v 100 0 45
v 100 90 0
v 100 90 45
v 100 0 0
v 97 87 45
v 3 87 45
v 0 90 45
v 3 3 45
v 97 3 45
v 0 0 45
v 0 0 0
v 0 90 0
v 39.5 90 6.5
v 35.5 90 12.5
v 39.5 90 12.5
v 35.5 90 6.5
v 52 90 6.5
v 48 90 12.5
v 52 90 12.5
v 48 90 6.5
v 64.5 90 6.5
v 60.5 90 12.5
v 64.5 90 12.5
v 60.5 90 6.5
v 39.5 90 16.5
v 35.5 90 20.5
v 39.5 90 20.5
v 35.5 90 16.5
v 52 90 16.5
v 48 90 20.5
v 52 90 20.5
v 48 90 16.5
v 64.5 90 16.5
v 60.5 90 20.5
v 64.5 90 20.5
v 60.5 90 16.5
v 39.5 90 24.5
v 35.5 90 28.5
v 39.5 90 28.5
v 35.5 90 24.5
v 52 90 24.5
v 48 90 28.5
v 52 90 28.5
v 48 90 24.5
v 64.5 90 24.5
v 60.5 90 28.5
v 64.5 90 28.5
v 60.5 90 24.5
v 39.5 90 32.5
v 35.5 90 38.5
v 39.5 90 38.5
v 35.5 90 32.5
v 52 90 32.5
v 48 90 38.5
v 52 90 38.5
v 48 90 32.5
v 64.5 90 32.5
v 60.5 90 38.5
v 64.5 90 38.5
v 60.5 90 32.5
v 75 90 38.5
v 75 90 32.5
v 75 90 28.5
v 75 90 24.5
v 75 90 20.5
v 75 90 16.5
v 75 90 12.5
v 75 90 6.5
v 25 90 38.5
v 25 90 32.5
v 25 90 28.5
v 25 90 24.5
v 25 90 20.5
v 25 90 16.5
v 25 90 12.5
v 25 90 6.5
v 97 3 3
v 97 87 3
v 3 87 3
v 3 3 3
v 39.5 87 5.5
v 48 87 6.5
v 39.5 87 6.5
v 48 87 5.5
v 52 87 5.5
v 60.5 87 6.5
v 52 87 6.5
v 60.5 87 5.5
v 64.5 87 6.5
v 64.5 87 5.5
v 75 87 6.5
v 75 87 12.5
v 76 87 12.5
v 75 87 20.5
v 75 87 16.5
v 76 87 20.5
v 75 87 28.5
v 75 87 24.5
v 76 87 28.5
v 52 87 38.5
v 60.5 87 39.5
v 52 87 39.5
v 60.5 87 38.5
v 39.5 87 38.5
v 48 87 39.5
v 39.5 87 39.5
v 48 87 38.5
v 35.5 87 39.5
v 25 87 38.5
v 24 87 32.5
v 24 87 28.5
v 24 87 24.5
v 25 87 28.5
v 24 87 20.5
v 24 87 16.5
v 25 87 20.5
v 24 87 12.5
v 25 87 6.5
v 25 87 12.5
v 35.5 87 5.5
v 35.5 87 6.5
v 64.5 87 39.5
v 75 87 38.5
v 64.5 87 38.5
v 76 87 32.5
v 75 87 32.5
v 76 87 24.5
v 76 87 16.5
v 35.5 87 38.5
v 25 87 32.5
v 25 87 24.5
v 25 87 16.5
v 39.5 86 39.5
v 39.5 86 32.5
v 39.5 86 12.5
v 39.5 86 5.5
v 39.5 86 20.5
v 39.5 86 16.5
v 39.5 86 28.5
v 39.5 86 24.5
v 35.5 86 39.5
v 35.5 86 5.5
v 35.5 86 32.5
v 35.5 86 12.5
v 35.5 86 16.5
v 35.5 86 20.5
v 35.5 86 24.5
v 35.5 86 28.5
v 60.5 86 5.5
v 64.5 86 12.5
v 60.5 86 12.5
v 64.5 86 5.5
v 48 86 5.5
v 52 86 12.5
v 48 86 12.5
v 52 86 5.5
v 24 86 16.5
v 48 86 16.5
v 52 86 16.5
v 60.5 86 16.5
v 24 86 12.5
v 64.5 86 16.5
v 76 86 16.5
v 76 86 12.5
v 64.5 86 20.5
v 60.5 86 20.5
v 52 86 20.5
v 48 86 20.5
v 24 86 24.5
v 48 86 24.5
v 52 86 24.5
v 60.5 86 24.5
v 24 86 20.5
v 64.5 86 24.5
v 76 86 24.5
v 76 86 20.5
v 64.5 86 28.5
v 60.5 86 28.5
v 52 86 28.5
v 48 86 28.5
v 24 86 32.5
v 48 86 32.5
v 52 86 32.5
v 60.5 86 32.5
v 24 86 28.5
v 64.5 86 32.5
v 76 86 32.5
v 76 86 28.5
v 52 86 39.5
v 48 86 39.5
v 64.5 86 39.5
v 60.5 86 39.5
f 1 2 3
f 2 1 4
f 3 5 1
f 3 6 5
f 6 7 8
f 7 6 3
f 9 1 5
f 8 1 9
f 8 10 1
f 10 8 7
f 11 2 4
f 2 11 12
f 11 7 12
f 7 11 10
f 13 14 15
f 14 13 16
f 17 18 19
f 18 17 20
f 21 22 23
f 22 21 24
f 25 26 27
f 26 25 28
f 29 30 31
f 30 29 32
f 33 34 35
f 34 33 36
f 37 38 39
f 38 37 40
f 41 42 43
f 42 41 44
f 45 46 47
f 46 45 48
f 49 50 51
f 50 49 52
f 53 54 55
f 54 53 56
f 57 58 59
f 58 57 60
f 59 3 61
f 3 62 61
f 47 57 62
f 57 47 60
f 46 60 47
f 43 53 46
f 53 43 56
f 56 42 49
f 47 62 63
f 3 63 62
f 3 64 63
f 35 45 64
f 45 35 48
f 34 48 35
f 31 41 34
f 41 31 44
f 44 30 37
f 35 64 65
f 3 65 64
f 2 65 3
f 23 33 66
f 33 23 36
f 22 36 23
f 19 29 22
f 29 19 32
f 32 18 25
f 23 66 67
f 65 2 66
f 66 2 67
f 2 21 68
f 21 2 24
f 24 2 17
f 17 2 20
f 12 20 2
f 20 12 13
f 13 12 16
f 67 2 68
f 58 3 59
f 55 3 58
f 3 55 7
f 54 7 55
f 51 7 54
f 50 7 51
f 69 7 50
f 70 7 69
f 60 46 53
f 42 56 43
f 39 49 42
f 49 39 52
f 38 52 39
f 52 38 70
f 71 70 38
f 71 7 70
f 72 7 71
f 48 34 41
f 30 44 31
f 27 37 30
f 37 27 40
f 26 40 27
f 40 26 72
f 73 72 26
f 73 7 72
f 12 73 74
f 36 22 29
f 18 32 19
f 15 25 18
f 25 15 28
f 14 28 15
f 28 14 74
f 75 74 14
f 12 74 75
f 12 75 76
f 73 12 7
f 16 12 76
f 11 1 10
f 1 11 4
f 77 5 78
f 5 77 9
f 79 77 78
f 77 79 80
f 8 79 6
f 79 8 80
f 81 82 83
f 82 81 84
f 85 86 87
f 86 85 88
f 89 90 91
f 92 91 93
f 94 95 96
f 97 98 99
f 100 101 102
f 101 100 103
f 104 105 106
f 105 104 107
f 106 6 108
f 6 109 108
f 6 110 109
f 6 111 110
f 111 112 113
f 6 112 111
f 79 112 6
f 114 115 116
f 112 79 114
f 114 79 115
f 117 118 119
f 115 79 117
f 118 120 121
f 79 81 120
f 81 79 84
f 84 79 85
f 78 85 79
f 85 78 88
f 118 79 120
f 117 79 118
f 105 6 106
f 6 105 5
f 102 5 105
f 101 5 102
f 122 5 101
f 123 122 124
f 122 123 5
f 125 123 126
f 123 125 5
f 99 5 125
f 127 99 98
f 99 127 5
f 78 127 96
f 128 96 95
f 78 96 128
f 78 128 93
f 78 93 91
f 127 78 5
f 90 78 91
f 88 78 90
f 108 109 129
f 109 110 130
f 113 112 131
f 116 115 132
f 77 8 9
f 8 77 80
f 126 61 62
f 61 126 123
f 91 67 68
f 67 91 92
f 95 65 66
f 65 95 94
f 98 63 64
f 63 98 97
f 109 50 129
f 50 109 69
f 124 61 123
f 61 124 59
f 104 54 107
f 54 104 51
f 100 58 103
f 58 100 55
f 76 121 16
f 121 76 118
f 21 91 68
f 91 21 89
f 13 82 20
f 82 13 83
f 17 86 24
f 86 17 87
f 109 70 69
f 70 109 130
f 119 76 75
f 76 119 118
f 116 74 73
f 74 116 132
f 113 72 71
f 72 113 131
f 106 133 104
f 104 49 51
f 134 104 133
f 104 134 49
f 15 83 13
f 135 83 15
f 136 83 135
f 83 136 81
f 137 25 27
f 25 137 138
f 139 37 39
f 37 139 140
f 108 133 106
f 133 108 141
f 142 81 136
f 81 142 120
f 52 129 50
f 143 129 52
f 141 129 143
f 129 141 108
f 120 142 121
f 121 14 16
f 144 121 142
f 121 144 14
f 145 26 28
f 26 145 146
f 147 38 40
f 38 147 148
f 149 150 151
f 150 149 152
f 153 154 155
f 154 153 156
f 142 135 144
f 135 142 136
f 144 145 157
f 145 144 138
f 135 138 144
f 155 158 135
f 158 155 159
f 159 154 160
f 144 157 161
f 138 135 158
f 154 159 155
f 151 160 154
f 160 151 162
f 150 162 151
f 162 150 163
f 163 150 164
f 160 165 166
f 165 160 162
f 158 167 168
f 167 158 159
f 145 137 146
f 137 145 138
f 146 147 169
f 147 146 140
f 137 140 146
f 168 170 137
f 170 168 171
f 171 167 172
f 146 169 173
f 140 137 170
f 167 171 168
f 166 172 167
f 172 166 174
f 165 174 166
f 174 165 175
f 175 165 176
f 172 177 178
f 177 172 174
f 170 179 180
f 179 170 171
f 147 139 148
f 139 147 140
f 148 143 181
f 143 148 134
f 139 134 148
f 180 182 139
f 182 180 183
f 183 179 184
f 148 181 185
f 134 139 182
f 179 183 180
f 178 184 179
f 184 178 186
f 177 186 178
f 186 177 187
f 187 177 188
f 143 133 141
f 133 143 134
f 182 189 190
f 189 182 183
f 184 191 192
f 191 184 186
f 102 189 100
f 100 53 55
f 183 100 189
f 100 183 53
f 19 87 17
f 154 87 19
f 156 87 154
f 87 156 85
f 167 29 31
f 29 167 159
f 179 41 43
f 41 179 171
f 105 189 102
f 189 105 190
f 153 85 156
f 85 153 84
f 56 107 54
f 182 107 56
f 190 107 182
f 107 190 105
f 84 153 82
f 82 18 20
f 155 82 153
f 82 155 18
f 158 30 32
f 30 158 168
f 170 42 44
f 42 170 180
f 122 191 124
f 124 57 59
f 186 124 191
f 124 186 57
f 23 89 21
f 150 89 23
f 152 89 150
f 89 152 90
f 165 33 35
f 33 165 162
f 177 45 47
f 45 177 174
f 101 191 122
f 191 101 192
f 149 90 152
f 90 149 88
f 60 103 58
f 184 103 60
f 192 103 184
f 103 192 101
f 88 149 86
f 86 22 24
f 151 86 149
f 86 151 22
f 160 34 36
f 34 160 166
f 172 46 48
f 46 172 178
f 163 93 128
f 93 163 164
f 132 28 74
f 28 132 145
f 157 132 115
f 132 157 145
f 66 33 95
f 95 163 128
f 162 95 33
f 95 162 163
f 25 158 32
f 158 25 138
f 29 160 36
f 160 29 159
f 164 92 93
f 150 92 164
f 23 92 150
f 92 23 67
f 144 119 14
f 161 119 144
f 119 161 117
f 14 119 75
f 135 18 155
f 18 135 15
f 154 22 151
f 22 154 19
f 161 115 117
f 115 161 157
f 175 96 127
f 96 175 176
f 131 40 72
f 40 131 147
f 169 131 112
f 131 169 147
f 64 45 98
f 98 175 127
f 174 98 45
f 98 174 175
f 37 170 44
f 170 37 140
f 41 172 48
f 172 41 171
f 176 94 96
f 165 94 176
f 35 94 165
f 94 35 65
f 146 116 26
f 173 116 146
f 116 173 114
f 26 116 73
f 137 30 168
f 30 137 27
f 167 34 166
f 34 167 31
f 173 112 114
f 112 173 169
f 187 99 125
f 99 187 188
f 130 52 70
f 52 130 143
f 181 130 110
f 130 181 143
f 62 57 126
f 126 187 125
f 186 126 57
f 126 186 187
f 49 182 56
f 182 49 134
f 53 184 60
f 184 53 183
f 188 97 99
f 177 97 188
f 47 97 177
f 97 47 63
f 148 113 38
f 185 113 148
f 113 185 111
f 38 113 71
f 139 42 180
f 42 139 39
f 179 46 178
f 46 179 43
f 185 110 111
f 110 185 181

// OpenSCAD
$fn = 32;

// ----------------------------------------------------------------------
// Vent box: crossgrid enclosure
// ----------------------------------------------------------------------

// --- parameters (mm) ---
box_l = 100;              // box length, X
box_w = 90;               // box width, Y
box_h = 45;               // box height, Z
wall_t = 3;               // shell wall thickness
win_l = 50;               // vent window width, X
win_h = 32;               // vent window height, Z
bar_w = 4;                // grid bar width
n_v = 3;                  // vertical bar count
n_h = 3;                  // horizontal bar count
fit_tol = 0.02;           // tolerance for press fits, mm
free_tol = 0.2;           // tolerance for clearance fits, mm

win_z0 = (box_h - win_h) / 2;  // window lower edge Z
v_step = win_l / (n_v + 1);  // vertical bar step
h_step = win_h / (n_h + 1);  // horizontal bar step

difference() {
  union() {
    difference() {
      cube([box_l, box_w, box_h]);
  translate([wall_t, wall_t, wall_t])
    cube([box_l - 2 * wall_t, box_w - 2 * wall_t, box_h]);
  translate([(box_l - win_l) / 2, box_w - wall_t - 1, win_z0])
    cube([win_l, wall_t + 2, win_h]);
    }
    for (i = [1 : n_v])
      translate([(box_l - win_l) / 2 + i * v_step - bar_w / 2,
                 box_w - wall_t - 1, win_z0 - 1])
        cube([bar_w, wall_t + 1, win_h + 2]);
    for (i = [1 : n_h])
      translate([(box_l - win_l) / 2 - 1, box_w - wall_t - 1,
                 win_z0 + i * h_step - bar_w / 2])
        cube([win_l + 2, wall_t + 1, bar_w]);
  }
}
